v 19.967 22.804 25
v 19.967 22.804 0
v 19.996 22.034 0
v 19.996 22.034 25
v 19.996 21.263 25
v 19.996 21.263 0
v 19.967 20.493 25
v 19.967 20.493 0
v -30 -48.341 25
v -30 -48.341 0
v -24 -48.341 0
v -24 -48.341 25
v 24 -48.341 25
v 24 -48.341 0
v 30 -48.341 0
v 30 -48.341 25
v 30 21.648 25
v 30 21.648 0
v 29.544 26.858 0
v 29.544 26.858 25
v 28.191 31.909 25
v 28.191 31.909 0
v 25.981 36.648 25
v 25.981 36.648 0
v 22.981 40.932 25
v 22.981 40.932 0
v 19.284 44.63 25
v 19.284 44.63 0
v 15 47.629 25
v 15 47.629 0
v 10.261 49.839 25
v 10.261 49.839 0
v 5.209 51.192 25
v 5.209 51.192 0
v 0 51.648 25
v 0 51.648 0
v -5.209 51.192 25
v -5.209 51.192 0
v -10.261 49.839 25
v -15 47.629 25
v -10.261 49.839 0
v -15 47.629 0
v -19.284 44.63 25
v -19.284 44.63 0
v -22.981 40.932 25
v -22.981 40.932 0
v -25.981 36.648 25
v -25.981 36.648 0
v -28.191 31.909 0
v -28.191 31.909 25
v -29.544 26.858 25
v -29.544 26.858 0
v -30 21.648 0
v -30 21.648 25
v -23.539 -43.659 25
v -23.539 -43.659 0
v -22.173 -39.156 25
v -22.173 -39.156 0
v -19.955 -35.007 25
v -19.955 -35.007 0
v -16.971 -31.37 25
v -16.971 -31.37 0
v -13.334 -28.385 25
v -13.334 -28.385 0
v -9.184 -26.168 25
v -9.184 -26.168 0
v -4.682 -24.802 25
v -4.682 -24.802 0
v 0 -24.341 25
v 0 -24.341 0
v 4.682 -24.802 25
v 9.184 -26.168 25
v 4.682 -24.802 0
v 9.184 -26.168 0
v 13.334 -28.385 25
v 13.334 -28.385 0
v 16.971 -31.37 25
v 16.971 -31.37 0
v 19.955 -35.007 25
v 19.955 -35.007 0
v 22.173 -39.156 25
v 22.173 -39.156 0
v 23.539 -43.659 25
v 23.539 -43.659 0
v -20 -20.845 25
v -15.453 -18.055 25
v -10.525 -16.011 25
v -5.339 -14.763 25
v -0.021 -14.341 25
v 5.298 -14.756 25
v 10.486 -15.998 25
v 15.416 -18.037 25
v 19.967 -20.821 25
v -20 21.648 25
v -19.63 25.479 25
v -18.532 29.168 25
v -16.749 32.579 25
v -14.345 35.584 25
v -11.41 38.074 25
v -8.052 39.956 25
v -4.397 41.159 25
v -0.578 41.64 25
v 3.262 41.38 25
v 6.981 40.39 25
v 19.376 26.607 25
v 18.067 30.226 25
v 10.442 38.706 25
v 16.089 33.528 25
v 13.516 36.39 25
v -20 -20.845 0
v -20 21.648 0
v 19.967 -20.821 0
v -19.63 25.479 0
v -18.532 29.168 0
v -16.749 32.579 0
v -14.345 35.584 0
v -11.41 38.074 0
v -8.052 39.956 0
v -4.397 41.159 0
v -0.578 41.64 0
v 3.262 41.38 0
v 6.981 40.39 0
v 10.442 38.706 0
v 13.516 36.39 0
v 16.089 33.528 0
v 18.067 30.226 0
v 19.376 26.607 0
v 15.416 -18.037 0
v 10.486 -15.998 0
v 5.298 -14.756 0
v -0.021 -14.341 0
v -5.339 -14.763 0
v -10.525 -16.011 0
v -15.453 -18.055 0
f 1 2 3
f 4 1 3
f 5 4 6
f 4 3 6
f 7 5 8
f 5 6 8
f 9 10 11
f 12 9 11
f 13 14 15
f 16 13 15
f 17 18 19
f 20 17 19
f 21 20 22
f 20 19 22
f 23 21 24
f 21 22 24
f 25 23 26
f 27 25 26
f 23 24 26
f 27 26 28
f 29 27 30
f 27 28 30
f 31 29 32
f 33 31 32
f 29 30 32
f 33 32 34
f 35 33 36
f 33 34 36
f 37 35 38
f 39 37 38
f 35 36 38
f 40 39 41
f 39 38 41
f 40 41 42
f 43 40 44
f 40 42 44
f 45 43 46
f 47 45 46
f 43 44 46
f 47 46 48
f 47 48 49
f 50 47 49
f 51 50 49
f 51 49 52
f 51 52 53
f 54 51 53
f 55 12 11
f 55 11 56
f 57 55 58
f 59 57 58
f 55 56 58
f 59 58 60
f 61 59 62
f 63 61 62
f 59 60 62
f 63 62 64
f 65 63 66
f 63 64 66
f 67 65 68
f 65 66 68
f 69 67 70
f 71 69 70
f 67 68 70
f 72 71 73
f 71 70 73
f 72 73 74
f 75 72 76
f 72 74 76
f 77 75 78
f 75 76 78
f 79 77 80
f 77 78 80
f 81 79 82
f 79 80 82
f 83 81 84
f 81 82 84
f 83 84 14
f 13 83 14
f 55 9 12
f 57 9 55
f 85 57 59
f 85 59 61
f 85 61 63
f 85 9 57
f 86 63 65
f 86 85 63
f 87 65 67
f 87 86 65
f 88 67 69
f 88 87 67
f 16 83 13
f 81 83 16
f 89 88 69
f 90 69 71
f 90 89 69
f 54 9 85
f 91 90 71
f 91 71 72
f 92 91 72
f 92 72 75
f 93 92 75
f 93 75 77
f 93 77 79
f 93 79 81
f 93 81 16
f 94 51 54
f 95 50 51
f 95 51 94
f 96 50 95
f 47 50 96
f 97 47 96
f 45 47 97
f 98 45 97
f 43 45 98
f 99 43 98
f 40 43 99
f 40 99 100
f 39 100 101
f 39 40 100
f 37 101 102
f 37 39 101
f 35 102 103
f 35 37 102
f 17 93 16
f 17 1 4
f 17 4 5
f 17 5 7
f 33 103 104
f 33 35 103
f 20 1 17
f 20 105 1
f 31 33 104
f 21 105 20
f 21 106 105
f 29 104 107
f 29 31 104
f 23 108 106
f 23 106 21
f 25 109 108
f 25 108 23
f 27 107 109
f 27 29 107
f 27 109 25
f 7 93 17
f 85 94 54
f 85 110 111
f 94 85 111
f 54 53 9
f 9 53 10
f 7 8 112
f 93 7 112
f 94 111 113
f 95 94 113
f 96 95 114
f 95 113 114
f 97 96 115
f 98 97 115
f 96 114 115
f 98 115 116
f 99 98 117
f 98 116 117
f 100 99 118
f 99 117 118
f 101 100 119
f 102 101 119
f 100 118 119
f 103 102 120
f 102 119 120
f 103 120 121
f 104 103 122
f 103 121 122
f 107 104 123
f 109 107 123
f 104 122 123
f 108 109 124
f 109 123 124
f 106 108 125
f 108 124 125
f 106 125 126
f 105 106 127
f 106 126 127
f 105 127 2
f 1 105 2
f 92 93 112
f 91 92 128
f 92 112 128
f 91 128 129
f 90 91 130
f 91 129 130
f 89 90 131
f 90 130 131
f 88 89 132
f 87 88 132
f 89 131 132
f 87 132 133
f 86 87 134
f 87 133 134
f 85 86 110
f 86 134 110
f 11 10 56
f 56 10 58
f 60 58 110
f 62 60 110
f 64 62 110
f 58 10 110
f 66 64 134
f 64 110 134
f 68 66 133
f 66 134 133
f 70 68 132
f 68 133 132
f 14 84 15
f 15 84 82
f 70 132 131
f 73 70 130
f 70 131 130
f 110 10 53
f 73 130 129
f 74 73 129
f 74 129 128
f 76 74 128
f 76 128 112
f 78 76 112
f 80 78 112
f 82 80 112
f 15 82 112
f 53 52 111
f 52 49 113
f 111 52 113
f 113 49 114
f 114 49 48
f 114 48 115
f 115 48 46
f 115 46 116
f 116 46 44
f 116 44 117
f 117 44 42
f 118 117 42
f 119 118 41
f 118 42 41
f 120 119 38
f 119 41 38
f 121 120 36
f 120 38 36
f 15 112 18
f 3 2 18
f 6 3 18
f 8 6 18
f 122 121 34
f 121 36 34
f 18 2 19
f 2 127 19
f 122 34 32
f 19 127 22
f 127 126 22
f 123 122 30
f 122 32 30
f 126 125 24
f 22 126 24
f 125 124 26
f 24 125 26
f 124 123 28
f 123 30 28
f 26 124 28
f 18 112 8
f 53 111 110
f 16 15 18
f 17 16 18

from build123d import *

# Parameters (mm, degrees)
F1_DEPTH = 25


with BuildPart() as f1:
    # F0 (on Top) → F1 (new body)
    with BuildSketch(Plane.XY):
        with BuildLine():
            Line((30, -48.34076), (30, 21.648188))
            ThreePointArc((30, 21.648188), (0, 51.648188), (-30, 21.648188))
            Line((-30, 21.648188), (-30, -48.34076))
            Line((-30, -48.34076), (-24, -48.34076))
            ThreePointArc((-24, -48.34076), (0, -24.34076), (24, -48.34076))
            Line((24, -48.34076), (30, -48.34076))
        make_face()
        with BuildLine():
            ThreePointArc((19.966583, 22.803858), (20, 21.648188), (19.966583, 20.492519))
            Line((19.966583, 20.492519), (19.966583, -20.821029))
            ThreePointArc((19.966583, -20.821029), (-0.020652, -14.340766), (-20, -20.845306))
            Line((-20, -20.845306), (-20, 21.648188))
            ThreePointArc((-20, 21.648188), (-0.578076, 41.639832), (19.966583, 22.803858))
        make_face(mode=Mode.SUBTRACT)
    extrude(amount=F1_DEPTH)


solid = f1.part
